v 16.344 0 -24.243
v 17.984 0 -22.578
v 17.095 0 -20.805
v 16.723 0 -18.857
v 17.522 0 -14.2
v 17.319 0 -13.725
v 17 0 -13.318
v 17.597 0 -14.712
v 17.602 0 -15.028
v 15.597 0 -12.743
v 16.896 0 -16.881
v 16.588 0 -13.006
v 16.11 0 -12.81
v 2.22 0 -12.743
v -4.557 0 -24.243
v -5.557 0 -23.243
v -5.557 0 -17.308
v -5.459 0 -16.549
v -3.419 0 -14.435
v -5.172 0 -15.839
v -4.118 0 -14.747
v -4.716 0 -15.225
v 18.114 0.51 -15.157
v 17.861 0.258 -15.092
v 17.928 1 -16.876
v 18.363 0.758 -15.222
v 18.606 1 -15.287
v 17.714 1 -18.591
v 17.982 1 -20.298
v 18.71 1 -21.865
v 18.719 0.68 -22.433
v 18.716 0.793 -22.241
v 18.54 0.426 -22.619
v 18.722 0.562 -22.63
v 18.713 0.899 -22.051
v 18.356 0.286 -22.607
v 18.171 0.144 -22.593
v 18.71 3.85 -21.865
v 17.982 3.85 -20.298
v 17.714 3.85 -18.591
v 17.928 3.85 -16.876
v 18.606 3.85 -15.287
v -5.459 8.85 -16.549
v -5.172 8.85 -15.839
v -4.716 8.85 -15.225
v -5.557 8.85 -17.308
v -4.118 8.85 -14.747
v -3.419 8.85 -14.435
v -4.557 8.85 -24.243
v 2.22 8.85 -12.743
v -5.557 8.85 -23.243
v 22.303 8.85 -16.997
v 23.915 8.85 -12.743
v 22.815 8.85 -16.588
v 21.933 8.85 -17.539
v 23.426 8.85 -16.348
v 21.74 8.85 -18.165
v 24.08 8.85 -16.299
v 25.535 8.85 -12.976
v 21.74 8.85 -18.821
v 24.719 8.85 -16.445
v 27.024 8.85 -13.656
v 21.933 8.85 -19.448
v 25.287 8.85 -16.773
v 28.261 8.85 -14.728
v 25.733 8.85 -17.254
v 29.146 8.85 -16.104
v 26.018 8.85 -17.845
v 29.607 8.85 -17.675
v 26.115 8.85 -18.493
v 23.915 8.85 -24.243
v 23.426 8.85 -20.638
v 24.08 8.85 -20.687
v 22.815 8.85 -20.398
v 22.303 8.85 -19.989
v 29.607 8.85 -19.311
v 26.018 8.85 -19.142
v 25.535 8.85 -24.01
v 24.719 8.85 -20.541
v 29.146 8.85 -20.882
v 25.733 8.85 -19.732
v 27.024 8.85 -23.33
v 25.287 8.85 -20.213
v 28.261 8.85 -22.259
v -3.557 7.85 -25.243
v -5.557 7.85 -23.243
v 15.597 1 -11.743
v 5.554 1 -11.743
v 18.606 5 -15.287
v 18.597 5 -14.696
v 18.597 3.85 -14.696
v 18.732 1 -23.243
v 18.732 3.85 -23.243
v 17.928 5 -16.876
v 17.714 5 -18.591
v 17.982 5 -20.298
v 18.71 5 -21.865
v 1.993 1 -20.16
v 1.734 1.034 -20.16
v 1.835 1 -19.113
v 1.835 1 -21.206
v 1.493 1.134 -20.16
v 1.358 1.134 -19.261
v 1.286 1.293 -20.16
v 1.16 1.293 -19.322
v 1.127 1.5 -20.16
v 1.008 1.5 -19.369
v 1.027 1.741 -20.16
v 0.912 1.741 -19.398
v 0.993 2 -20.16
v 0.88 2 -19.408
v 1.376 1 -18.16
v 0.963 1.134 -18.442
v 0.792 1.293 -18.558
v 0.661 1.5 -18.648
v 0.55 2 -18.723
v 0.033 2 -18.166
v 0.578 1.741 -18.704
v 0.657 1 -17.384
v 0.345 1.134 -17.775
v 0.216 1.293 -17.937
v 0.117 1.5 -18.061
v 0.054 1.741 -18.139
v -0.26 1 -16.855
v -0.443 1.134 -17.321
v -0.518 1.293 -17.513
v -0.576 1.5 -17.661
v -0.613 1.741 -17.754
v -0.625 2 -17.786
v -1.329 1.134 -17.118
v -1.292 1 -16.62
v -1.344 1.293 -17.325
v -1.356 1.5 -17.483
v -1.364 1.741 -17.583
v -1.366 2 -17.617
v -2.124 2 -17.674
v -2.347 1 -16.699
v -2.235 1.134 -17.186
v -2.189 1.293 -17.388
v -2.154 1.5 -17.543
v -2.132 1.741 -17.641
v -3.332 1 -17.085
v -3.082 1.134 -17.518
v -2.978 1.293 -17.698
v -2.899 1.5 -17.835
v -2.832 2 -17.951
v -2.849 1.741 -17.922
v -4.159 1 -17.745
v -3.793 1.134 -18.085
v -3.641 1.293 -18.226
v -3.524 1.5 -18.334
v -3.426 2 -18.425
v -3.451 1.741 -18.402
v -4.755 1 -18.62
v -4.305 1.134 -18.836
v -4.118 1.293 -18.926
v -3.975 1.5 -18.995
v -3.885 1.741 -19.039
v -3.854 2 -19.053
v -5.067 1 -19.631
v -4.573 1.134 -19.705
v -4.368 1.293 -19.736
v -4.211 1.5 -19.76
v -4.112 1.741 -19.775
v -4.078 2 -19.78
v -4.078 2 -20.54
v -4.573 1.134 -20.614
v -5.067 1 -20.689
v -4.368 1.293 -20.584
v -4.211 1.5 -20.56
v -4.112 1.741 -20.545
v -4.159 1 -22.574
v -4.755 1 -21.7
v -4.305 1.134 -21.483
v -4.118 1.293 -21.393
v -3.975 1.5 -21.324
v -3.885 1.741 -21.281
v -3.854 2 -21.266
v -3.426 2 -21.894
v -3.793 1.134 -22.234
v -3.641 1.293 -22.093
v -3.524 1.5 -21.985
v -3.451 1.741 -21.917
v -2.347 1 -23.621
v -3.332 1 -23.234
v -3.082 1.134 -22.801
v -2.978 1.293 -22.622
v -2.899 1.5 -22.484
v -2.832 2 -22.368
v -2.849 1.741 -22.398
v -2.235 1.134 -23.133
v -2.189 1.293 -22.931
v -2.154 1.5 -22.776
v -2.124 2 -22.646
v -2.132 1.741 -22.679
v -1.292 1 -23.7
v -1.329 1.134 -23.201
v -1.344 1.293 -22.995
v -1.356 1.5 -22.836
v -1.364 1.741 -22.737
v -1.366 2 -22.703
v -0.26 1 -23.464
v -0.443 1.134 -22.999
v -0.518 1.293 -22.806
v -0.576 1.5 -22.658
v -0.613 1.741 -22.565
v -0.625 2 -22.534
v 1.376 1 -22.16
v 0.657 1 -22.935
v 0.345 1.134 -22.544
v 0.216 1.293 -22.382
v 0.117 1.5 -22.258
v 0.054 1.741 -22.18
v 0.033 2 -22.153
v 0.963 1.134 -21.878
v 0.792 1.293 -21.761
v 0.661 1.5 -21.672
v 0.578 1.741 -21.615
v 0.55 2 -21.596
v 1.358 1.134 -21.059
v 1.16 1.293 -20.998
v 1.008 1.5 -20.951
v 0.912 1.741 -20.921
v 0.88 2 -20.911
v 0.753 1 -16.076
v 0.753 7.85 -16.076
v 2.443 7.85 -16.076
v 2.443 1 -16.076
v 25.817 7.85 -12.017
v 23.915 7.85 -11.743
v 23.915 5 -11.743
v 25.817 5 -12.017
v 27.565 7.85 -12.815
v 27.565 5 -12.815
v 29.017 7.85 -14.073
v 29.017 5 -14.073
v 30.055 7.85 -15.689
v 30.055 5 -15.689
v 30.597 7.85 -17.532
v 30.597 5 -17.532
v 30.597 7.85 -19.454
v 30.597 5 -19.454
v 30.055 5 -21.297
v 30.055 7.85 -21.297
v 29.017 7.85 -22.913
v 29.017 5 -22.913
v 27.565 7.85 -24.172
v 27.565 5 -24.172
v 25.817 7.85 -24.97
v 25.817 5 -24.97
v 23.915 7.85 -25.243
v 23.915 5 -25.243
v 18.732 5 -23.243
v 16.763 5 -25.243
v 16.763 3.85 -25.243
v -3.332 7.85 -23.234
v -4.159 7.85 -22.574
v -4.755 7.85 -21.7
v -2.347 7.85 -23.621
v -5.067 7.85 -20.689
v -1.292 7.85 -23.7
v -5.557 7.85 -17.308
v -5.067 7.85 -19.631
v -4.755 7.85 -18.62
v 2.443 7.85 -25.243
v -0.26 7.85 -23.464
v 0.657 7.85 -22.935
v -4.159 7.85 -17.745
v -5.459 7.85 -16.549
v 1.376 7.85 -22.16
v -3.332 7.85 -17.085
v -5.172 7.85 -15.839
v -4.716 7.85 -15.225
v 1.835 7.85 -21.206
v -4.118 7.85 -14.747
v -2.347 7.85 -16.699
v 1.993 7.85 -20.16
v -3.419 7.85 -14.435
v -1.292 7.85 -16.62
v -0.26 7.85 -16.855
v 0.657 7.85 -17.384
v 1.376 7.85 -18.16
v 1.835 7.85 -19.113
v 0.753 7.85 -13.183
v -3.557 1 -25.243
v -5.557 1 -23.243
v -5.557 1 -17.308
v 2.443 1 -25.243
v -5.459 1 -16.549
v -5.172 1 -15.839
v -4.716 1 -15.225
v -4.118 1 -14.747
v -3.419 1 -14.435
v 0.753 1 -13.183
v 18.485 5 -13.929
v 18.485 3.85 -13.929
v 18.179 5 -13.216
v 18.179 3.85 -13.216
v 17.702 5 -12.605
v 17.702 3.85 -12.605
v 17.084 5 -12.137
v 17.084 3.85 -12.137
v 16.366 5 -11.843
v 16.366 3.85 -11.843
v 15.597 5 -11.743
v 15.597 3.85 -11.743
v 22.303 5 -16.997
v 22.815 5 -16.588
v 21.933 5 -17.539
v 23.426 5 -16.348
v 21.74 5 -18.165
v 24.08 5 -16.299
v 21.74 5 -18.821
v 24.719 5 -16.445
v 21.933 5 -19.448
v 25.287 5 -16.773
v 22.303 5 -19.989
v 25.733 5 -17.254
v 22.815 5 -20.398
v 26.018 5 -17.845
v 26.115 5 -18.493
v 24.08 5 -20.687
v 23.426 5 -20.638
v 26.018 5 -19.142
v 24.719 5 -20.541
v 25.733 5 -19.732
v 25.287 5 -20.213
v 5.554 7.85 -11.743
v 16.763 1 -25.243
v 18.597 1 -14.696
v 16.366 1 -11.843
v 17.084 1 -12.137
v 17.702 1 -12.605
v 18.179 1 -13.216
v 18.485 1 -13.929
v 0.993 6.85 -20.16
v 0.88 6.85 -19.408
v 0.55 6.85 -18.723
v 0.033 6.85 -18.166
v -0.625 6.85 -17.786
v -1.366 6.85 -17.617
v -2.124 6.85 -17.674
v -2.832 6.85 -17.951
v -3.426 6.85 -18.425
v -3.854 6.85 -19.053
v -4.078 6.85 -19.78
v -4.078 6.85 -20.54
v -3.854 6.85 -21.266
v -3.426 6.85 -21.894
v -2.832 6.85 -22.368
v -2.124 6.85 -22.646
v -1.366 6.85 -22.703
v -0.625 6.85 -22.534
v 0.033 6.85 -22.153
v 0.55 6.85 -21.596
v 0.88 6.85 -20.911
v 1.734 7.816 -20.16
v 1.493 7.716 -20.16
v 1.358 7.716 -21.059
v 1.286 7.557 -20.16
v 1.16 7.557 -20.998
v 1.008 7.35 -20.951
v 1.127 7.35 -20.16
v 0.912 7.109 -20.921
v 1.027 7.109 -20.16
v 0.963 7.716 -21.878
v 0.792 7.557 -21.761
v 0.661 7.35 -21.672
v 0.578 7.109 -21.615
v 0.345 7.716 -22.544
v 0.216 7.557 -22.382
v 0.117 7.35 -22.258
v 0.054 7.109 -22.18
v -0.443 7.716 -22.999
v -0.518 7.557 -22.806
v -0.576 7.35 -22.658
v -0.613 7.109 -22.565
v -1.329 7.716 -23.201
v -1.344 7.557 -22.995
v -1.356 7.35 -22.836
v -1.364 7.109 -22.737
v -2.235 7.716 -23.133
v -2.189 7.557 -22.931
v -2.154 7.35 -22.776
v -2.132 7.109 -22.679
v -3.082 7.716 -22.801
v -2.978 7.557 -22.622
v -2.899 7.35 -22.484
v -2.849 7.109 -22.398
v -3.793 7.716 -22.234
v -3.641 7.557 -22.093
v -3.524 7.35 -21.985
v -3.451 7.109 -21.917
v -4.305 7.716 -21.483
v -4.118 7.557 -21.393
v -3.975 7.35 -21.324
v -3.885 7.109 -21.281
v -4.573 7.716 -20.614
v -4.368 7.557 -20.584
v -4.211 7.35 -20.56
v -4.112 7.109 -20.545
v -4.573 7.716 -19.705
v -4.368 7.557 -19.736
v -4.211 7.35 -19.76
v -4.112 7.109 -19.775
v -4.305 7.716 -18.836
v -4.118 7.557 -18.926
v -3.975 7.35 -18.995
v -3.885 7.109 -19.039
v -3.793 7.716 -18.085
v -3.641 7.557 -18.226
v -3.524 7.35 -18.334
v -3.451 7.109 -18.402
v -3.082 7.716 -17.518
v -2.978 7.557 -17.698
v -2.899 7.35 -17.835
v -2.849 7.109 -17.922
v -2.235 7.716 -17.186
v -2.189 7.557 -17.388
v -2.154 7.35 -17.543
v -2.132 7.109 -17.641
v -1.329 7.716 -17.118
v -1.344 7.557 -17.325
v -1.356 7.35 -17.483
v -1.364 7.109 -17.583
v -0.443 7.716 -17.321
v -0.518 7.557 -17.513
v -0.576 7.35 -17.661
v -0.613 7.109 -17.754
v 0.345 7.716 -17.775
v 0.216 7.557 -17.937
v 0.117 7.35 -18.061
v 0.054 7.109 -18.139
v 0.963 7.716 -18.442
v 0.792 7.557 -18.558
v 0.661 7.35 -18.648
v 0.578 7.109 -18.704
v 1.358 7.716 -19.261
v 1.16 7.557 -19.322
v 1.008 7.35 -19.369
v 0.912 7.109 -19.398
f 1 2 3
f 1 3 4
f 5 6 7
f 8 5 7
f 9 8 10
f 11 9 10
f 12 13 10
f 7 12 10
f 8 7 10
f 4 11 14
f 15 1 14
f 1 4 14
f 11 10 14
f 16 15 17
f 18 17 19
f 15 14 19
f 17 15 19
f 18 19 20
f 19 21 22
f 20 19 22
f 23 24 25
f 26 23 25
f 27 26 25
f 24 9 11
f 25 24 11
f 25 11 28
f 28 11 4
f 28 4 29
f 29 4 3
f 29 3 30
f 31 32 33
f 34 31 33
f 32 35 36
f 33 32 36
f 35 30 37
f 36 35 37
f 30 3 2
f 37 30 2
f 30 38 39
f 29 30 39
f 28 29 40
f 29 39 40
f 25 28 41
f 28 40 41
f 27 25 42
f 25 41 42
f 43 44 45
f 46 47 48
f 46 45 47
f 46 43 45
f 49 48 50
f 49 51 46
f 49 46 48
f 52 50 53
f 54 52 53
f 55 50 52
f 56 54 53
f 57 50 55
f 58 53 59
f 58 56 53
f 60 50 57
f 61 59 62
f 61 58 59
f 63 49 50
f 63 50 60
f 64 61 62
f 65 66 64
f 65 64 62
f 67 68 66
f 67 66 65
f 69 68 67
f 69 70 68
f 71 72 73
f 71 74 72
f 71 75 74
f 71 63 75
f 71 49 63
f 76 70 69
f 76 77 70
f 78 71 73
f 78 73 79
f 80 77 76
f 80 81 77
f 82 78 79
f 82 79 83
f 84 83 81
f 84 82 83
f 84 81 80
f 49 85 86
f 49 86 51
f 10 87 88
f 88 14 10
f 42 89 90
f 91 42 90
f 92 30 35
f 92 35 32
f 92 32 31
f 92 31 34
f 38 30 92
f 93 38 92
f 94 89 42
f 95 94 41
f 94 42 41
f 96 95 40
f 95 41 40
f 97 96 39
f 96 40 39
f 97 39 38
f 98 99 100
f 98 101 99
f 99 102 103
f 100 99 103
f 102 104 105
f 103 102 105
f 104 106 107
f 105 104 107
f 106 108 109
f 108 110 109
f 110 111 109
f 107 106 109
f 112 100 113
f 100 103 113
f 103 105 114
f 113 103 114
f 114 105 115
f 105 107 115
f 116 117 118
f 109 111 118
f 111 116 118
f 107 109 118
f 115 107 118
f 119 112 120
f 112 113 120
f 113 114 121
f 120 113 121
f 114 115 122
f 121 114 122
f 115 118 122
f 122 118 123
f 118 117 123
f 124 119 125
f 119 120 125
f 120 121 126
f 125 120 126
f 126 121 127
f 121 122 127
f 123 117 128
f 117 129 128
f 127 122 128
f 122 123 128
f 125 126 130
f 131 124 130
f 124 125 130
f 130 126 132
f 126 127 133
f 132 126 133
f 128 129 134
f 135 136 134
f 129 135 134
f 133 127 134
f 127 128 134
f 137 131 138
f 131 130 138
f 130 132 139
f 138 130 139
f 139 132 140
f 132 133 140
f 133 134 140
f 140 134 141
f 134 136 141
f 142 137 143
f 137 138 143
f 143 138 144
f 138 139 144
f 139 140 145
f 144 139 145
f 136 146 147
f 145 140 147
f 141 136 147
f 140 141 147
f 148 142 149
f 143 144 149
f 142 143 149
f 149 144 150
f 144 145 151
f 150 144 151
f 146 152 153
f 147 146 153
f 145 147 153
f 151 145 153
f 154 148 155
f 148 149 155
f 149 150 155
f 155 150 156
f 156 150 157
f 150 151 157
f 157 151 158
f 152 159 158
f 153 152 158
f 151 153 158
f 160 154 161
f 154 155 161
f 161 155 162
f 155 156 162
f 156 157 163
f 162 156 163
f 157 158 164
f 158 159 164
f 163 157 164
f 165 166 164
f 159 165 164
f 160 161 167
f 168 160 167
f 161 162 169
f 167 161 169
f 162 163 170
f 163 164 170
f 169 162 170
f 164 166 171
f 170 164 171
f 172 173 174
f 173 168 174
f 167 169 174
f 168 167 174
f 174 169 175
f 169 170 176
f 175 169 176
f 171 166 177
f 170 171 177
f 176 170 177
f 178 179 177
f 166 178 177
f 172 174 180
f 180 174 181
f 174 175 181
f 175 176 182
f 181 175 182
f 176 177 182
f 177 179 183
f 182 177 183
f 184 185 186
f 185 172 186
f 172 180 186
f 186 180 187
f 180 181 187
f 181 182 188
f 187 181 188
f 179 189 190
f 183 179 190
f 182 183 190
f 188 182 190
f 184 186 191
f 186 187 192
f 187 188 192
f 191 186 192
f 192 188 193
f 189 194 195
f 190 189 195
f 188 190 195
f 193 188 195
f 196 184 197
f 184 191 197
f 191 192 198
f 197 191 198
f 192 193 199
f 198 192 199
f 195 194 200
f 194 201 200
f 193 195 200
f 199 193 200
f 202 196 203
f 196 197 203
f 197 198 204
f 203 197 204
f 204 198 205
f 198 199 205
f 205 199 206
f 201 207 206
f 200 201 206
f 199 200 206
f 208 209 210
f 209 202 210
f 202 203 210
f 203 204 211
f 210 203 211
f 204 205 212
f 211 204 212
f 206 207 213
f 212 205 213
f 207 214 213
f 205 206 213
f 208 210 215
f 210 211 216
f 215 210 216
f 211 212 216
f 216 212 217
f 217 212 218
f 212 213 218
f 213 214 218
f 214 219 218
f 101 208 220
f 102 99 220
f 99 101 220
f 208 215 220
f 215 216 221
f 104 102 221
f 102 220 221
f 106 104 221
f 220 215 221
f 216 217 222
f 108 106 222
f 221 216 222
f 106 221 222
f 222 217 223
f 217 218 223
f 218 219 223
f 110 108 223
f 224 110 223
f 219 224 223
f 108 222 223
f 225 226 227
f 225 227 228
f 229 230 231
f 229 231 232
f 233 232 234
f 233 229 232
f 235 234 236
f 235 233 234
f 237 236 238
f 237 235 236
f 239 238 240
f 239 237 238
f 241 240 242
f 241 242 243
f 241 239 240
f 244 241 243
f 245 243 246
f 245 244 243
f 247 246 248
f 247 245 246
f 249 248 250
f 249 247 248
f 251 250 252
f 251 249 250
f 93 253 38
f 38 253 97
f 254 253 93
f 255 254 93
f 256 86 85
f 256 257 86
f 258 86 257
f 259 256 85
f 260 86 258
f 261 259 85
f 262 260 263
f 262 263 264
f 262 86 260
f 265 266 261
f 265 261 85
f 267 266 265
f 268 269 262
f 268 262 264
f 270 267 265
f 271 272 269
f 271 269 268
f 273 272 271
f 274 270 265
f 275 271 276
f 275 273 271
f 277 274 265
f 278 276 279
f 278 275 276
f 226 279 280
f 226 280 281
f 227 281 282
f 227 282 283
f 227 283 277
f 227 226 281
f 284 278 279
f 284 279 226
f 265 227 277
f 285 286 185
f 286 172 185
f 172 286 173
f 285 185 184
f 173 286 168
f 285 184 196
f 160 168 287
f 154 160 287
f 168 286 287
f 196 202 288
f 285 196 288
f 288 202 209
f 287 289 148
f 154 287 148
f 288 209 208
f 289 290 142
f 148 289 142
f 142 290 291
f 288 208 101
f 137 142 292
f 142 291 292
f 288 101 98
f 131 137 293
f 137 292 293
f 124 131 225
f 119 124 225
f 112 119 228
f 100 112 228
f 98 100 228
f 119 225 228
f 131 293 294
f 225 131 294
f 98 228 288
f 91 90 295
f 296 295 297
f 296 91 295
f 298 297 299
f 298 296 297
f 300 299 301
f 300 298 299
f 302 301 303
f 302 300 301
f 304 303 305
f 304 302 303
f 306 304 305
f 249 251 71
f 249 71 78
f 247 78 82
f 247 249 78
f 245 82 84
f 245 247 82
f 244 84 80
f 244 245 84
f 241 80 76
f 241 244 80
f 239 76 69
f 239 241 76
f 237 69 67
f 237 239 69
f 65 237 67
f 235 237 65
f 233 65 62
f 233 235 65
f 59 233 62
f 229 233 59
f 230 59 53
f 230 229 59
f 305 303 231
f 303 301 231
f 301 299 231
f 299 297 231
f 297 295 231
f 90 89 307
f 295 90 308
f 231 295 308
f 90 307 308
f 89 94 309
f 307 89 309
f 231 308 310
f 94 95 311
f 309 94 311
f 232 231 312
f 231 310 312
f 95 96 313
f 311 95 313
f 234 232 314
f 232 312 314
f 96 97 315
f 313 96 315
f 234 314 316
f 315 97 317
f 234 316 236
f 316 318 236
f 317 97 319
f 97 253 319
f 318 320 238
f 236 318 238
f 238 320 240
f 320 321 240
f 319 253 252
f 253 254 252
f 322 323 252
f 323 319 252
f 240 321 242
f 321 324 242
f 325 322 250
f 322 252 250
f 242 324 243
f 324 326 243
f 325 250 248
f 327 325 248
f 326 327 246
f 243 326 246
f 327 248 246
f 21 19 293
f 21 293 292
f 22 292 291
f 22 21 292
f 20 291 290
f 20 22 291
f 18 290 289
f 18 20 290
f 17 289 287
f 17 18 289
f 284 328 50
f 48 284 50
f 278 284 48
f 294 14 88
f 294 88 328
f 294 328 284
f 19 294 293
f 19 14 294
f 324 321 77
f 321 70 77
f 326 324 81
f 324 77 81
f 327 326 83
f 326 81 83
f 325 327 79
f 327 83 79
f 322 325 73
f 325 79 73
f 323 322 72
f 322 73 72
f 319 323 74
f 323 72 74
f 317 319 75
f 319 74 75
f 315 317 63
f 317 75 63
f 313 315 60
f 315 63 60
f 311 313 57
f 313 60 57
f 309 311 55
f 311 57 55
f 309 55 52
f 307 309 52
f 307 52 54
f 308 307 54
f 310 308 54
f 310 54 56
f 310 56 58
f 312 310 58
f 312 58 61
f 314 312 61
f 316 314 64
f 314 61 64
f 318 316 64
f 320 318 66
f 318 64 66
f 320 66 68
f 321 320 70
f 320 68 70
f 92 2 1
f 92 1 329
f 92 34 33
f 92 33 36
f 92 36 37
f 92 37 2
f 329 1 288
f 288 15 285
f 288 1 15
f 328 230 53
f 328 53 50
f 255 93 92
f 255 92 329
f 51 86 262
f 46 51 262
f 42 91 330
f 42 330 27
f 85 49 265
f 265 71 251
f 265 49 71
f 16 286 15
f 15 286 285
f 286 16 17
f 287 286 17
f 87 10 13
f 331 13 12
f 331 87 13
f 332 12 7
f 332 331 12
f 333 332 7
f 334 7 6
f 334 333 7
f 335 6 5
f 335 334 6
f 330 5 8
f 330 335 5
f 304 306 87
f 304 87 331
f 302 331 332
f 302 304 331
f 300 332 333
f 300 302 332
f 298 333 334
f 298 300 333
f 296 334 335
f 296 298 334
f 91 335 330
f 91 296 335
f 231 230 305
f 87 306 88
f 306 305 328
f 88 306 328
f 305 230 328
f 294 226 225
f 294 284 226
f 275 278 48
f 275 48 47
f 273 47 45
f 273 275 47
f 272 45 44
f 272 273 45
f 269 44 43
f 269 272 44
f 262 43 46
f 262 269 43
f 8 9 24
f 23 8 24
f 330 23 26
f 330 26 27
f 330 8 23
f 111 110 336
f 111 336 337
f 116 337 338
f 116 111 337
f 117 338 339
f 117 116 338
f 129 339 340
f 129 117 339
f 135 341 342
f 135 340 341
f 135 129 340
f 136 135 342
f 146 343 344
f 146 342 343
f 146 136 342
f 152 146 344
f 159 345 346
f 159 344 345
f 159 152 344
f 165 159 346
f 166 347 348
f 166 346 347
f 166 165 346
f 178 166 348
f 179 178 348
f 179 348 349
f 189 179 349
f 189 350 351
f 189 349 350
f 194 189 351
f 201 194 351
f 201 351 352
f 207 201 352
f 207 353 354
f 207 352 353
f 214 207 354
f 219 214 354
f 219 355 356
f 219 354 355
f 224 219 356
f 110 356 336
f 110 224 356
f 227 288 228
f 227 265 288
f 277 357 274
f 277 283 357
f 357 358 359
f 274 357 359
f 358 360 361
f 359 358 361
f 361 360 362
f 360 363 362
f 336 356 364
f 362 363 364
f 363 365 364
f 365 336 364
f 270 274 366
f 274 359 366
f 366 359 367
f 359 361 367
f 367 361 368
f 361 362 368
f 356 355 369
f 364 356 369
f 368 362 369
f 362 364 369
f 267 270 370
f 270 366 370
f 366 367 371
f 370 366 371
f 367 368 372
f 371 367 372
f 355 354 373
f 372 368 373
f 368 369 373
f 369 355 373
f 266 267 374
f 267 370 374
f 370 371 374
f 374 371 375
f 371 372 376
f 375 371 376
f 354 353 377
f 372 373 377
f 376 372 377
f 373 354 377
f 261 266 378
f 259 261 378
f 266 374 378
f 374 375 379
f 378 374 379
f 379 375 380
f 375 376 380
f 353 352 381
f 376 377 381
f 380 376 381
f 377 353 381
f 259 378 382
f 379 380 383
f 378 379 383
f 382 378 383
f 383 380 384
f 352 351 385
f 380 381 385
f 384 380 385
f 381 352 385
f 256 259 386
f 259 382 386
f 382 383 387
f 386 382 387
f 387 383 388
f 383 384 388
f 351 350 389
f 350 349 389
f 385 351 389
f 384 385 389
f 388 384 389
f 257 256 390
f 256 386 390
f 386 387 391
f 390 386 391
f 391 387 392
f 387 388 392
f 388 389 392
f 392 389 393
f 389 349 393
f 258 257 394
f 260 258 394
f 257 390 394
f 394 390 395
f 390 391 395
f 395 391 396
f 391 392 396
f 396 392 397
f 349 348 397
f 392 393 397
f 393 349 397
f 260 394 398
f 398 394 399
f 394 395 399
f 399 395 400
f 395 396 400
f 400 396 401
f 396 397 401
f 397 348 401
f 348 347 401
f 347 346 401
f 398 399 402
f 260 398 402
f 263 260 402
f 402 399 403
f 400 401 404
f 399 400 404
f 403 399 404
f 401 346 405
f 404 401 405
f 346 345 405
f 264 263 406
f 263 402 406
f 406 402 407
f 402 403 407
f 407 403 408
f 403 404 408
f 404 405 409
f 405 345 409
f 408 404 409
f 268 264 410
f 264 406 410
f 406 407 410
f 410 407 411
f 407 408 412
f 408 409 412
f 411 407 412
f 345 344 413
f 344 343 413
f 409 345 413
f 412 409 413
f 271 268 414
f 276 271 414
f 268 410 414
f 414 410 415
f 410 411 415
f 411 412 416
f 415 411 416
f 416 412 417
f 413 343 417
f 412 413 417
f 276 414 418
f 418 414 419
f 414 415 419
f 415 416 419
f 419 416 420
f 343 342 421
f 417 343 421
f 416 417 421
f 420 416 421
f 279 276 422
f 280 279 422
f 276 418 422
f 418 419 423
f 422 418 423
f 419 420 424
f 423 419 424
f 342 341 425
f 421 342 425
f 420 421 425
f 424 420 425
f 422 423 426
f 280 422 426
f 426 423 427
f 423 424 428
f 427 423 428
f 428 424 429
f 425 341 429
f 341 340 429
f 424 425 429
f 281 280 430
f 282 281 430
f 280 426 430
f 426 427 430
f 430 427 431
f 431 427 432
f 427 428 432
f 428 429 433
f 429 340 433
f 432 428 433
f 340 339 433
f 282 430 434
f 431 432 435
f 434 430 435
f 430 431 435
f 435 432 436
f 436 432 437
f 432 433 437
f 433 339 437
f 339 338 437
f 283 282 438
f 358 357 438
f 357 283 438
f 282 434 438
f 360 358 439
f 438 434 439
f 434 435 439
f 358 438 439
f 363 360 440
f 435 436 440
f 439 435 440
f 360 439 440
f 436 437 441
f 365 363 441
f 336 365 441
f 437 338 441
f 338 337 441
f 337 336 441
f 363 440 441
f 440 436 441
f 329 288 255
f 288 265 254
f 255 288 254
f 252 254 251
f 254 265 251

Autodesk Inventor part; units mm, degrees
ref_plane "YZ Plane" through (0, 0, 0) normal (1, 0, 0) x (0, 1, 0)
ref_plane "XZ Plane" through (0, 0, 0) normal (0, 1, 0) x (-1, 0, 0)
ref_plane "XY Plane" through (0, 0, 0) normal (0, 0, 1) x (1, 0, 0)
sketch "Sketch2" plane through (0, 0, 0) normal (0, 1, 0) x (-1, 0, 0)
  line L0 (-5.5536, -11.7431) -> (5.5568, -15.0764)
  line L1 (5.5568, -25.2431) -> (-23.9154, -25.2431)
  line L2 (-23.9154, -25.2431) -> (-23.9154, -11.7431)
  line L3 (-5.5536, -11.7431) -> (-23.9154, -11.7431)
  line L4 (5.5568, -25.2431) -> (5.5568, -15.0764)
  circle A0 centre (-23.9154, -18.4931) radius 6.75
  circle A1 centre (-23.9154, -18.4931) radius 2.2
  circle A2 centre (-23.9154, -18.4931) radius 6.202
  circle A3 centre (-24.9154, -18.9931) radius 6.25
  line L5 (-18.8553, -31.0955) -> (-18.419, -3.4058)
  point P0 (0, 0)
  point P1 (0, 0)
  point P2 (-19.4912, -10.8803)
  point P3 (-19.4912, -24.3803)
  point P4 (-23.9154, -12.2912)
  point P5 (-23.9154, -24.6951)
  dimension "d1" = 13.5
  dimension "d0" = 4.4
  dimension "d6" = 0.5
  dimension "d7" = 1
  dimension "d8" = 12.5
extrude "Extrusion1" add sketch "Sketch2" along normal blind 3.85 contours L0 L4 L1 L5 A0 L3 | L5 A0 L3 | A0 L5 A2 L2 | L2 A2 A3 A0 | A0 L5 A2 | L1 A0 L5 | A2 L5 A3 L2 | L2 A3 A2 | A3 A2 L2 A0 | L5 A2 A3 | A2 L5 | A0 A3 L2 | L2 A3 A2 L5 A0 | A3 A2 L2 A1 | L2 A1 A2 A3 | L2 A2 A3
extrude "Extrusion2" add sketch "Sketch2" along normal blind 8.85 contours L0 L4 L1 L5 A0 L3 | L5 A0 L3 | A0 L5 A2 L2 | A0 L5 A2 | L1 A0 L5 | L2 A3 A2 L5 A0 | L2 A2 A3 picked at (-23.6214, -24.9369)
sketch "Sketch3" plane through (0, 8.85, 0) normal (0, 1, 0) x (1, 0, 0)
  line L0 (-5.5568, 25.2431) -> (-5.5568, 15.0764) projected
  line L1 (-5.5568, 15.0764) -> (5.5536, 11.7431) projected
  line L2 (5.5536, 11.7431) -> (23.9154, 11.7431) projected
  line L3 (23.9154, 11.7431) -> (23.9154, 12.2912) projected
  arc A0 (23.9154, 24.6951) -> (23.9154, 12.2912) centre (23.9154, 18.4931) ccw projected
  line L4 (23.9154, 24.6951) -> (23.9154, 25.2431) projected
  line L5 (23.9154, 25.2431) -> (-5.5568, 25.2431) projected
  line L6 (18.8553, 31.0955) -> (18.419, 3.4058) projected
  point P0 (0, 0)
  point P1 (18.6062, 15.2873)
  point P2 (18.5504, 11.7431)
  point P3 (18.7631, 25.2431)
  point P4 (18.7099, 21.8646)
extrude "Extrusion3" cut sketch "Sketch3" against normal up to surface (5 mm away) contours L5 L4 A0 L6 | L6 A0 L3 L2
sketch "Sketch4" plane through (-5.5568, 0, -25.2431) normal (-1, 0, 0) x (0, 0, 1)
  line L0 (0, 0) -> (10.1667, 0) projected
  line L1 (10.1667, 0) -> (10.1667, 8.85) projected
  line L2 (0, 8.85) -> (10.1667, 8.85) projected
  line L3 (0, 0) -> (0, 8.85) projected
  line L4 (9.1667, 7.85) -> (9.1667, 1)
  line L5 (9.1667, 1) -> (1, 1)
  line L6 (1, 1) -> (1, 7.85)
  line L7 (1, 7.85) -> (9.1667, 7.85)
  point P0 (25.2431, 0)
  dimension "d11" = 1
extrude "Extrusion4" cut sketch "Sketch4" against normal blind 8 contours L4 L5 L6 L7
sketch "Sketch5" plane through (-5.5568, 1, -16.0764) normal (0, 1, 0) x (1, 0, 0)
  line L0 (0, 0) -> (0, 8.1667) projected
  line L1 (0, 0) -> (8, 0) projected
  line L2 (8, 0) -> (8, 8.1667) projected
  line L3 (0, 8.1667) -> (8, 8.1667) projected
  line L4 (8, 4.0834) -> (2.9855, 4.0834) construction
  line L5 (4, 0) -> (4, 4.0834) construction
  circle A0 centre (4, 4.0834) radius 2.55
  point P0 (5.5568, -16.0764)
  dimension "d14" = 5.1
extrude "Extrusion5" add sketch "Sketch5" along normal up to surface (6.85 mm away) contours A0
sketch "Sketch6" plane through (5.5536, 0, -11.7431) normal (0, 0, 1) x (1, 0, 0)
  line L0 (-11.1104, 7.85) -> (-11.1104, 1) projected
  line L1 (-11.1104, 7.85) -> (-4.8007, 7.85)
  line L2 (-4.8007, 7.85) -> (-4.8007, 1)
  line L3 (-11.1104, 1) -> (-4.8007, 1)
  point P0 (-5.5536, 0)
extrude "Extrusion6" cut sketch "Sketch6" against normal up to surface (4.3333 mm away)
sketch "Sketch7" plane through (-5.5568, 1, -24.2431) normal (0, 0, 1) x (1, 0, 0)
  line L0 (0, 0) -> (0, 6.85) projected
  line L1 (0, 0) -> (8, 0) projected
  line L2 (8, 0) -> (8, 6.85) projected
  line L3 (0, 6.85) -> (8, 6.85) projected
  point P0 (5.5568, -1)
extrude "Extrusion7" cut sketch "Sketch7" against normal blind 10.25
sketch "Sketch8" plane through (0, 8.85, 0) normal (0, 1, 0) x (1, 0, 0)
  circle A0 centre (-1.5568, 20.1598) radius 2.55 projected
  circle A1 centre (-1.5568, 20.1598) radius 2.55 projected
  line L0 (-5.5568, 25.2431) -> (2.4432, 25.2431) projected
  point P0 (0, 0)
fillet "Fillet1" radius 3 2 edges at (-5.5568, 8.35, -15.0764) (-5.5568, 0.5, -15.0764)
chamfer "Chamfer1" distance 2 angle 45 2 edges at (-5.5568, 8.35, -25.2431) (-5.5568, 0.5, -25.2431)
chamfer "Chamfer2" distance 2 angle 45 1 edges at (18.7631, 6.35, -25.2431)
fillet "Fillet2" radius 3 1 edges at (18.5504, 6.35, -11.7431)
sketch "Sketch9" plane through (0, 3.85, 0) normal (0, 1, 0) x (1, 0, 0)
  arc A0 (23.9154, 11.7431) -> (23.9154, 25.2431) centre (23.9154, 18.4931) ccw projected
  line L0 (16.7631, 25.2431) -> (23.9154, 25.2431) projected
  line L1 (18.7316, 23.2434) -> (16.7631, 25.2431) projected
  line L2 (18.7099, 21.8646) -> (18.7316, 23.2434) projected
  arc A1 (18.7099, 21.8646) -> (18.6062, 15.2873) centre (23.9154, 18.4931) ccw projected
  line L3 (18.5969, 14.6959) -> (18.6062, 15.2873) projected
  arc A2 (15.5973, 11.7431) -> (18.5969, 14.6959) centre (15.5973, 14.7431) ccw projected
  line L4 (23.9154, 11.7431) -> (15.5973, 11.7431) projected
  circle A3 centre (23.9154, 18.4931) radius 2.2 projected
  point P0 (0, 0)
extrude "Extrusion8" add sketch "Sketch9" against normal blind 3.85 from surface at 5
extrude "Extrusion9" cut sketch "Sketch9" against normal blind 10
chamfer "Chamfer4" distance 1 angle 45 9 edges at (17.7142, 0, -18.5909) (17.7018, 0, -12.6052) (10.5754, 0, -11.7431) (18.6016, 0, -14.9916) (17.7474, 0, -24.2433) (6.6031, 0, -25.2431) (10.1793, 8.85, -25.2431) (30.6654, 8.85, -18.4931) (14.7345, 8.85, -11.7431)
fillet "Fillet3" radius 1 2 edges at (-4.1068, 7.85, -20.1598) (-4.1068, 1, -20.1598)
ref_plane "Work Plane1" through (0, 4.425, 0) normal (0, -1, 0) x (1, 0, 0)
properties part number "Upper Leg_oposite"
